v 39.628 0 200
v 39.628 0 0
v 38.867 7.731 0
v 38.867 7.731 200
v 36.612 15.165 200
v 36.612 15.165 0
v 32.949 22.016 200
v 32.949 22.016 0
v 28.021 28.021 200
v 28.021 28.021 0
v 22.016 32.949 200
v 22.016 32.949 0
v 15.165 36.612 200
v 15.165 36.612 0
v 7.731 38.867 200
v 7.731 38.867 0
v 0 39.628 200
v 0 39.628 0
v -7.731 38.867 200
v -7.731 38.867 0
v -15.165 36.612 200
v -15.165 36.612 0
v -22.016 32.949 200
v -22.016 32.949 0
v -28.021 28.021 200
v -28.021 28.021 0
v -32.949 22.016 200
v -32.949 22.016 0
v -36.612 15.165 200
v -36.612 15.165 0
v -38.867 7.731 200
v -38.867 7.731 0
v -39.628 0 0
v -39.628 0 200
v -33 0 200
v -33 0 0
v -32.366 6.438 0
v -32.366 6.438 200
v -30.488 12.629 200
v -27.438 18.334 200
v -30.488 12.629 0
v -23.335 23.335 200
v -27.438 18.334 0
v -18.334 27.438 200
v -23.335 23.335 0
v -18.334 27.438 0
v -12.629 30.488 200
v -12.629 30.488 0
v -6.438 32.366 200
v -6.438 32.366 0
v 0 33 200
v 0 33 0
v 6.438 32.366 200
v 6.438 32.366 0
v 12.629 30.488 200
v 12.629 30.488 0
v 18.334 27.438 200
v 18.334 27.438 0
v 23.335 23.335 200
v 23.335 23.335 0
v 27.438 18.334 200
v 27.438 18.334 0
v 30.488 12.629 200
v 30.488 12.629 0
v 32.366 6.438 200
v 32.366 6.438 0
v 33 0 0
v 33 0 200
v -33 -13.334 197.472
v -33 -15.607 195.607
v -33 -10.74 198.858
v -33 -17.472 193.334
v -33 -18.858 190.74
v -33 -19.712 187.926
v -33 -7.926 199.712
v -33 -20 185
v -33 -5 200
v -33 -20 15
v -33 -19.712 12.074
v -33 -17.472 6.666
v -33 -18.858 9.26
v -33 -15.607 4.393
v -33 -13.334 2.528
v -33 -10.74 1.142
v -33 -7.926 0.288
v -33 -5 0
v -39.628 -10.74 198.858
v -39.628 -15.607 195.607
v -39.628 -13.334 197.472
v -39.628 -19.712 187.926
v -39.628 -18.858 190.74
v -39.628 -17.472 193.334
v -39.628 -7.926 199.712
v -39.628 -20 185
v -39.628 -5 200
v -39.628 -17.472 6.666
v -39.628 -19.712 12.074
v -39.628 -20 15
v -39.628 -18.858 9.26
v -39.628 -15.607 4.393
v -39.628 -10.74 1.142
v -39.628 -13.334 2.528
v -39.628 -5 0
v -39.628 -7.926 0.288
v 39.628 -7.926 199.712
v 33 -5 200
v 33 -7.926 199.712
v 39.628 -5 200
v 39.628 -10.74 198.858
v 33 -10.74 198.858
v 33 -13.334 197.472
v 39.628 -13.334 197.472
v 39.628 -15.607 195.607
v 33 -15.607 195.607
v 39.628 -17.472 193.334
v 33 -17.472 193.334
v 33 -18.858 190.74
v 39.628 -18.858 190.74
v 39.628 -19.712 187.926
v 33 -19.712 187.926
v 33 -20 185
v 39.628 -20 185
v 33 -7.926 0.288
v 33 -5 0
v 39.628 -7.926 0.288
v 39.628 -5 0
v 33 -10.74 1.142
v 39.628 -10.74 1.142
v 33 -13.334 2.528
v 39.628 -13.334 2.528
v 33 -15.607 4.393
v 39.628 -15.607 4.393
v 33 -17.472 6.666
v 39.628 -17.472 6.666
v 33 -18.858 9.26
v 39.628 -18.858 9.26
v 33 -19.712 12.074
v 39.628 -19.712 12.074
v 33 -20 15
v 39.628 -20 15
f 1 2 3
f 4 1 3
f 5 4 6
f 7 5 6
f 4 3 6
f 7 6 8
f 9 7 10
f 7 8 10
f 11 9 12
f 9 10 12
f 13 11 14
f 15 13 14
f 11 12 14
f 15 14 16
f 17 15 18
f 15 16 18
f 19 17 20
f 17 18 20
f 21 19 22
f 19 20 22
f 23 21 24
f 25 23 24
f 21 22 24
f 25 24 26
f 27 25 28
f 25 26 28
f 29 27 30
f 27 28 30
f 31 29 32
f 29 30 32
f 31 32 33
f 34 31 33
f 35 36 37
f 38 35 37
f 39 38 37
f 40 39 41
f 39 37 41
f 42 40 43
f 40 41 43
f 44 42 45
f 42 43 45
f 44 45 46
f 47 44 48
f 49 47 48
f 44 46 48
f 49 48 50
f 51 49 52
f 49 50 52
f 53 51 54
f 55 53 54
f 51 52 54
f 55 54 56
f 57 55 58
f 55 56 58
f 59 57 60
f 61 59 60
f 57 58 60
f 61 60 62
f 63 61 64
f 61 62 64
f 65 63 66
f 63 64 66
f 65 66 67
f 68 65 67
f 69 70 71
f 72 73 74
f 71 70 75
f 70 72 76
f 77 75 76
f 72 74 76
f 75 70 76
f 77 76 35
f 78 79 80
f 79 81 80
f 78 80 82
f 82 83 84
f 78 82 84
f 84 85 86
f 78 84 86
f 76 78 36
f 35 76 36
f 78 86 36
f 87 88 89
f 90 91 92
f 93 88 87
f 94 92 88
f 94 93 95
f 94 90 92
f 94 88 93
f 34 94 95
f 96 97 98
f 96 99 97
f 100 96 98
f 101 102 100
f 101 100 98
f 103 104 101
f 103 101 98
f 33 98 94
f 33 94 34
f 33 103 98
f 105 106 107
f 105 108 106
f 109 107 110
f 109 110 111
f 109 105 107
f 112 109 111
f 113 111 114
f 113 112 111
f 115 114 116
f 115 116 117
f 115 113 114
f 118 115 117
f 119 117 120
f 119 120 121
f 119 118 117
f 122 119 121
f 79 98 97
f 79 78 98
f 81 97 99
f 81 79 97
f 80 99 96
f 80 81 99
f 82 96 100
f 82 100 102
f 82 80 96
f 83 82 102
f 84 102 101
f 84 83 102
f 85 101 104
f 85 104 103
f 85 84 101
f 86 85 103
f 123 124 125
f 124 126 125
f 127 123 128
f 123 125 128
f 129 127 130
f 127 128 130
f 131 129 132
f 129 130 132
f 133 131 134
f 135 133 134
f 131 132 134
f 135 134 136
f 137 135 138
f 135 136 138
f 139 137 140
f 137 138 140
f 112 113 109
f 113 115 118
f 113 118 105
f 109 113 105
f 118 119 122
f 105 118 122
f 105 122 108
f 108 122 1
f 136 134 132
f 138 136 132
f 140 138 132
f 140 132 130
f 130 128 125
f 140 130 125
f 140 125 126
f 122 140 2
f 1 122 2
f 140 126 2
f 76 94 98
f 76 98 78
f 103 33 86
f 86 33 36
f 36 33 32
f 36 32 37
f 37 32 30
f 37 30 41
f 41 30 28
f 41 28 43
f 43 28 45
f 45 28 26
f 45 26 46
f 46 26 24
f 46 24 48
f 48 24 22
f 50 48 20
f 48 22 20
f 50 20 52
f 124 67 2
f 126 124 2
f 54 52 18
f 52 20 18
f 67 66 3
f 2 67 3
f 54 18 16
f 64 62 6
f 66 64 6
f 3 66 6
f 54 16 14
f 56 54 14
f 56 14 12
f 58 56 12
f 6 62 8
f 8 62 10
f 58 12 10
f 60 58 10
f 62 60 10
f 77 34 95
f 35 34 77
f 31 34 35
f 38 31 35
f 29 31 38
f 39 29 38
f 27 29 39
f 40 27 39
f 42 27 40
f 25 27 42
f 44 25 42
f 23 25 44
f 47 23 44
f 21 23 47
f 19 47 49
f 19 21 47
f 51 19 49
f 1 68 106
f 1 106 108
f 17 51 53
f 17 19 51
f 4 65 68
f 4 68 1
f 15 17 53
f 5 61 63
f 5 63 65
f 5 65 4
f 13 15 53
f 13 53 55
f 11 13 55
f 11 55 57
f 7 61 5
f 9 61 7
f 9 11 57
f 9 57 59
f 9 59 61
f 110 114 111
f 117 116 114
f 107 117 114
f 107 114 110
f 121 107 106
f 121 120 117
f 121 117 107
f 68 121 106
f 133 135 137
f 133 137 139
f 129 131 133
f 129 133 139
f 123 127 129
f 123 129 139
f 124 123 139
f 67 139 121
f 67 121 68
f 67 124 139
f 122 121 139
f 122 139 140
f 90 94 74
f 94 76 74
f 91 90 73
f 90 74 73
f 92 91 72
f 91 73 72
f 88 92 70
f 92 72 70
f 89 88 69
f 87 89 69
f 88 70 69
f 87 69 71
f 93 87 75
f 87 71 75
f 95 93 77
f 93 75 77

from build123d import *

# Parameters (mm, degrees)
ESTRUSIONE_ESTRUSIONE2_DEPTH = 200
SCHIZZO2_W                   = 6.628026169
SCHIZZO2_H                   = 20
ESTRUSIONE_ESTRUSIONE3_DEPTH = 200
RACCORDO3_R                  = 15


with BuildPart() as part:
    # Schizzo1 → Estrusione-Estrusione2 (new body)
    with BuildSketch(Plane.XY):
        with BuildLine():
            Line((-39.628026169, 0), (-33, 0))
            ThreePointArc((-33, 0), (0, 33), (33, 0))
            Line((33, 0), (39.628026169, 0))
            ThreePointArc((39.628026169, 0), (0, 39.628026169), (-39.628026169, 0))
        make_face()
    extrude(amount=ESTRUSIONE_ESTRUSIONE2_DEPTH)

    # Schizzo2 → Estrusione-Estrusione3 (add)
    with BuildSketch(Plane.XY):
        with Locations((-36.314013085, -10)):
            Rectangle(SCHIZZO2_W, SCHIZZO2_H)
        with Locations((36.314013085, -10)):
            Rectangle(SCHIZZO2_W, SCHIZZO2_H)
    extrude(amount=ESTRUSIONE_ESTRUSIONE3_DEPTH)

    # Raccordo3
    raccordo3_edges = [part.edges().sort_by_distance(p)[0] for p in [
        (-36.314013085, -20, 0),
        (-36.314013085, -20, 200),
        (36.314013085, -20, 0),
        (36.314013085, -20, 200),
    ]]
    fillet(raccordo3_edges, radius=RACCORDO3_R)


solid = part.part
